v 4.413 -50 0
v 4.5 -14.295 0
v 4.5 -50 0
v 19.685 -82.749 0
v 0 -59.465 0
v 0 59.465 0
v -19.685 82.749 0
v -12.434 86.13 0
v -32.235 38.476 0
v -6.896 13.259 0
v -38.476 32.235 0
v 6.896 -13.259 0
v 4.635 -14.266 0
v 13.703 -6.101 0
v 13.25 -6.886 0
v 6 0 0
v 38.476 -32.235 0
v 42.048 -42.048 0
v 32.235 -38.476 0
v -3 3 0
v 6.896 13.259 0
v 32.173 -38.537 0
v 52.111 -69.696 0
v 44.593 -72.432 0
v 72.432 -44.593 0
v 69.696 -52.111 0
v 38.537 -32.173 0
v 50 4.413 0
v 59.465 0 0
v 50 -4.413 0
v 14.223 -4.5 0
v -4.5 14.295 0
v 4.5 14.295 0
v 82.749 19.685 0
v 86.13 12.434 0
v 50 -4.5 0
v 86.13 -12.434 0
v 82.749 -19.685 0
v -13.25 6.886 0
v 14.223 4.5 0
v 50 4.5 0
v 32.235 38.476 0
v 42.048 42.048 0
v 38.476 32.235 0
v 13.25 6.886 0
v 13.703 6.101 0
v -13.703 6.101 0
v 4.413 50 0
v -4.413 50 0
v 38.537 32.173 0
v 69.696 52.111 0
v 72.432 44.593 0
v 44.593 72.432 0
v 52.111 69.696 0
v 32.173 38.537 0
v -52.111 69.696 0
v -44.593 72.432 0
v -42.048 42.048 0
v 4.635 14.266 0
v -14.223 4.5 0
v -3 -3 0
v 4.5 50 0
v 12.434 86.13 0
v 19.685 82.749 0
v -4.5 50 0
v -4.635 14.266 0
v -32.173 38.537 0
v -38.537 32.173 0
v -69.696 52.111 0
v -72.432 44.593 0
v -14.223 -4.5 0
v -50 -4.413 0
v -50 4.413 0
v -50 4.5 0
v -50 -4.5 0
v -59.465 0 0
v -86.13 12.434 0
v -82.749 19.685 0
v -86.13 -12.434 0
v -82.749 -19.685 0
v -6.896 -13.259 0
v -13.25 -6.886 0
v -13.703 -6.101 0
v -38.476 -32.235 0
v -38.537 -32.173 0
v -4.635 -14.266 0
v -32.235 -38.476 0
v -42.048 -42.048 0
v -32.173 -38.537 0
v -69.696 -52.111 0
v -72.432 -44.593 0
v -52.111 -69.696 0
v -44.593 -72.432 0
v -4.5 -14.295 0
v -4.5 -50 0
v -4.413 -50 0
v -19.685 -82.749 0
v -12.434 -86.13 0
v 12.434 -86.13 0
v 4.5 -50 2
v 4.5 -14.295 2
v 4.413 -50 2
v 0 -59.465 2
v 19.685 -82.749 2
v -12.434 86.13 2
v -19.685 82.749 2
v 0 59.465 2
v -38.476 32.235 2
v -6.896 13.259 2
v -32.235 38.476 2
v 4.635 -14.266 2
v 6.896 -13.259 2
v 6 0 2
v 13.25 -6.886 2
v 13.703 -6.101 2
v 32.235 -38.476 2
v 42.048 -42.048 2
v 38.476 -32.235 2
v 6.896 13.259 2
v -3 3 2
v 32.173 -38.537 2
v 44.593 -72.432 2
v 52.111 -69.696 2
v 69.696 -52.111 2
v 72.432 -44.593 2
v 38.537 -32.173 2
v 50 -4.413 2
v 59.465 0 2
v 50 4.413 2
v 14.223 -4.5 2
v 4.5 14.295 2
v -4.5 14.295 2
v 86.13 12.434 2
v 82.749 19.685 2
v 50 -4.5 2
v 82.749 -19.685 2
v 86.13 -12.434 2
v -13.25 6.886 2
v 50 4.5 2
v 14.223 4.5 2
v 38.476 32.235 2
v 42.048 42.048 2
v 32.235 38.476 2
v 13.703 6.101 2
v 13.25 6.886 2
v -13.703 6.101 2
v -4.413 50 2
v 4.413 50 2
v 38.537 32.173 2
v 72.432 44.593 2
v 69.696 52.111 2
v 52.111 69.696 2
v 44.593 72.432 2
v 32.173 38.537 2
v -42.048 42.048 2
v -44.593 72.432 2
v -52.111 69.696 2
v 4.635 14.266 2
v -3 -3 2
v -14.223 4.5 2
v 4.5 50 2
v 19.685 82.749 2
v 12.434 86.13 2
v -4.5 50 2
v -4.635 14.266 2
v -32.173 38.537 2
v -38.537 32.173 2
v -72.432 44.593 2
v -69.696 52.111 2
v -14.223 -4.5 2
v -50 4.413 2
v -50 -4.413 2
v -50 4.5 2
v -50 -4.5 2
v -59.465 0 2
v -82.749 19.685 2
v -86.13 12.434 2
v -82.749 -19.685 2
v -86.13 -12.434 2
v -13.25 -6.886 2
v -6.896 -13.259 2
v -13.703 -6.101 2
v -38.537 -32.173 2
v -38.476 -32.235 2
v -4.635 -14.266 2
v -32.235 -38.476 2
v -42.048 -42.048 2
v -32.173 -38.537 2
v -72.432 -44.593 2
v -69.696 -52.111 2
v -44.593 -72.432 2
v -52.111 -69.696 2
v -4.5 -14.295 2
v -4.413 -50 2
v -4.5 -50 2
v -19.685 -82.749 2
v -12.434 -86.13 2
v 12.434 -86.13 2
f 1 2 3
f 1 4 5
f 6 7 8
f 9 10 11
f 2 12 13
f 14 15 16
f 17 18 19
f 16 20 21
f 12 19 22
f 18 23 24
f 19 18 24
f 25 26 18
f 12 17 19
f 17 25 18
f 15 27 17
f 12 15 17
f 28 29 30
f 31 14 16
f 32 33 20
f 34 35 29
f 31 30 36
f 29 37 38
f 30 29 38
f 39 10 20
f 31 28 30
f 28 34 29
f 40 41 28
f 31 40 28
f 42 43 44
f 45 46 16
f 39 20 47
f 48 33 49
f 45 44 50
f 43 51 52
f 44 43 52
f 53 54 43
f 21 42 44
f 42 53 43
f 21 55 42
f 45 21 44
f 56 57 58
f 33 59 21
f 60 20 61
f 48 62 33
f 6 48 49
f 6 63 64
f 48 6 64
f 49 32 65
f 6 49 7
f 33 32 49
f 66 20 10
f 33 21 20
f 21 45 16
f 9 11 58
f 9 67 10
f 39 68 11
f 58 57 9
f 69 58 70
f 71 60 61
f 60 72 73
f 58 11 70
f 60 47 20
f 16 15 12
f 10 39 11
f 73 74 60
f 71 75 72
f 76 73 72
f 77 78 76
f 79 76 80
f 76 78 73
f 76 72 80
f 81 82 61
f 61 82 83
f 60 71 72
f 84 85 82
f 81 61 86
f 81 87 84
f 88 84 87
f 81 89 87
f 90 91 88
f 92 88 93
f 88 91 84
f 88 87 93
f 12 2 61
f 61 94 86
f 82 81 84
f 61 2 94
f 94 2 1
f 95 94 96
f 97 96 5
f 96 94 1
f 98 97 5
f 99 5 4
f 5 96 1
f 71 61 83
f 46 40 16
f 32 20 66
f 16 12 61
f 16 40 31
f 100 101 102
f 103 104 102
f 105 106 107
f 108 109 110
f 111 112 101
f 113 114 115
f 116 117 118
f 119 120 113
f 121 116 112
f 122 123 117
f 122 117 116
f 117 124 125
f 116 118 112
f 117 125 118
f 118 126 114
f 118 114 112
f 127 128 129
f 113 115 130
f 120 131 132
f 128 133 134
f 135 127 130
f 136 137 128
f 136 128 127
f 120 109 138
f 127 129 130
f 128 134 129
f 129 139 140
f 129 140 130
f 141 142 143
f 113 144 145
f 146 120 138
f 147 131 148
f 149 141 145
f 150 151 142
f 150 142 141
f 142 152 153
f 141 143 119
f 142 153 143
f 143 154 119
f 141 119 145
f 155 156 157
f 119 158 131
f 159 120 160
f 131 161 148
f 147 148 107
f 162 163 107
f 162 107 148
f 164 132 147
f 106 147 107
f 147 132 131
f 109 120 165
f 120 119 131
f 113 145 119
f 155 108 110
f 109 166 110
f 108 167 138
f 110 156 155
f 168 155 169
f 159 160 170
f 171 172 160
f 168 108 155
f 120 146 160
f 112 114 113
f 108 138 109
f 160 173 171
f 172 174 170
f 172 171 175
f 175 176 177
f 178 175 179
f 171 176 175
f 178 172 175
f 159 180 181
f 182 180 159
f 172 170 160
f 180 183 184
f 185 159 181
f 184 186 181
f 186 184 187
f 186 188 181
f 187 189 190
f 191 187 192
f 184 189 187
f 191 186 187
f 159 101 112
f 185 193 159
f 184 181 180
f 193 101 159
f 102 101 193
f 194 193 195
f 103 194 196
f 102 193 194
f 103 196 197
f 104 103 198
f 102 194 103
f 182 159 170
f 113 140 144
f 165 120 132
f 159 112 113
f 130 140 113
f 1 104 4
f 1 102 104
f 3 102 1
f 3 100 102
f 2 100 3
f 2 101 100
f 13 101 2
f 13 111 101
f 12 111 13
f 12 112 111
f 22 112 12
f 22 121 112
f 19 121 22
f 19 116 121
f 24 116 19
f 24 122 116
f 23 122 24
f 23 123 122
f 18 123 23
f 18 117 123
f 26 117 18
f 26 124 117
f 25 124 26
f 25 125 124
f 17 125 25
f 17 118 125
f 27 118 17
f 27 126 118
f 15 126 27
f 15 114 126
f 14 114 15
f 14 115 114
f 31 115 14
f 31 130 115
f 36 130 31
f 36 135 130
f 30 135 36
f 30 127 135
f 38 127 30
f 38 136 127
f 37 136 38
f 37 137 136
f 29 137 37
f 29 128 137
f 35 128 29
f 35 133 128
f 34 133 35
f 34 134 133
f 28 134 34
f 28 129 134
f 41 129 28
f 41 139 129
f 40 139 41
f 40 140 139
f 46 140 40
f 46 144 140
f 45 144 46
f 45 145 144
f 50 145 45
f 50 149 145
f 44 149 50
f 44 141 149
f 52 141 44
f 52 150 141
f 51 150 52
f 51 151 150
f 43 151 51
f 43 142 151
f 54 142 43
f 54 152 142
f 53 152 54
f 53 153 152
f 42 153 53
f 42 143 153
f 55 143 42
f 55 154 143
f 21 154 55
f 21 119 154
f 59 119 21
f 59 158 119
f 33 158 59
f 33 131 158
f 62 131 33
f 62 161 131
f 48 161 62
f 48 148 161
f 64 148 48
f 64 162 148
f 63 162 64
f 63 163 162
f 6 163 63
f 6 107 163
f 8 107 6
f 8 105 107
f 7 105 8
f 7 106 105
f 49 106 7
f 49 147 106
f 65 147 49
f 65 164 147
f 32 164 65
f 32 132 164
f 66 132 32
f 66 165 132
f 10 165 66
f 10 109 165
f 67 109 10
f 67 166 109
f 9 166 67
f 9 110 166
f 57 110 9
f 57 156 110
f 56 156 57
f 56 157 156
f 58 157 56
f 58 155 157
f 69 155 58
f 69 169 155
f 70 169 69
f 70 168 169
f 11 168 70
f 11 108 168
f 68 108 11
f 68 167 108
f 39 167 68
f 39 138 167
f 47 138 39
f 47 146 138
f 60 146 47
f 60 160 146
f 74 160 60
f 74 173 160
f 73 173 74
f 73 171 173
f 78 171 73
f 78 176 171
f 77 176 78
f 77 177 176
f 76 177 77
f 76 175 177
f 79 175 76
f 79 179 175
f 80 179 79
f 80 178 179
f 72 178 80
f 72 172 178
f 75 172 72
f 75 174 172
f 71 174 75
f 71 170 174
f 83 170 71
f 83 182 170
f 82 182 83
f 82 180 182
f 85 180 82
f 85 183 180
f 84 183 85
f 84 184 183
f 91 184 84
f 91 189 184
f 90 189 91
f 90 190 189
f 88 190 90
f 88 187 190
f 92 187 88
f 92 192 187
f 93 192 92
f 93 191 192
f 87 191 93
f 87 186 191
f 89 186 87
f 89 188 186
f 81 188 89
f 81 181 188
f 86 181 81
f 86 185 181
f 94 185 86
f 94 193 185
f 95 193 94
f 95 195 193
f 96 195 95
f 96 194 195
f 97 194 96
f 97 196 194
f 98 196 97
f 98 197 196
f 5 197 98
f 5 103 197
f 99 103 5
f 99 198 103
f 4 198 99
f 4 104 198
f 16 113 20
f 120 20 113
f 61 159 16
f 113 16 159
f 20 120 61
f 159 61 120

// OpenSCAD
linear_extrude(2) {
  difference() {
    union() {
      for (a = [0:0.125:1]) {
        rotate([0, 0, a*360]) {
          translate([0, 25])
            square([9, 50], center=true);
          translate([0, 50])
            for (b = 25 * [1, -1])
              rotate([0, 0, b])
                translate([0, 18])
                  square([8, 40], center=true);
        }
      }
      circle(15);
    }
    
    polygon([
      [6, 0],
      [-3, -3],
      [-3, 3],
    ]);
  }
}
